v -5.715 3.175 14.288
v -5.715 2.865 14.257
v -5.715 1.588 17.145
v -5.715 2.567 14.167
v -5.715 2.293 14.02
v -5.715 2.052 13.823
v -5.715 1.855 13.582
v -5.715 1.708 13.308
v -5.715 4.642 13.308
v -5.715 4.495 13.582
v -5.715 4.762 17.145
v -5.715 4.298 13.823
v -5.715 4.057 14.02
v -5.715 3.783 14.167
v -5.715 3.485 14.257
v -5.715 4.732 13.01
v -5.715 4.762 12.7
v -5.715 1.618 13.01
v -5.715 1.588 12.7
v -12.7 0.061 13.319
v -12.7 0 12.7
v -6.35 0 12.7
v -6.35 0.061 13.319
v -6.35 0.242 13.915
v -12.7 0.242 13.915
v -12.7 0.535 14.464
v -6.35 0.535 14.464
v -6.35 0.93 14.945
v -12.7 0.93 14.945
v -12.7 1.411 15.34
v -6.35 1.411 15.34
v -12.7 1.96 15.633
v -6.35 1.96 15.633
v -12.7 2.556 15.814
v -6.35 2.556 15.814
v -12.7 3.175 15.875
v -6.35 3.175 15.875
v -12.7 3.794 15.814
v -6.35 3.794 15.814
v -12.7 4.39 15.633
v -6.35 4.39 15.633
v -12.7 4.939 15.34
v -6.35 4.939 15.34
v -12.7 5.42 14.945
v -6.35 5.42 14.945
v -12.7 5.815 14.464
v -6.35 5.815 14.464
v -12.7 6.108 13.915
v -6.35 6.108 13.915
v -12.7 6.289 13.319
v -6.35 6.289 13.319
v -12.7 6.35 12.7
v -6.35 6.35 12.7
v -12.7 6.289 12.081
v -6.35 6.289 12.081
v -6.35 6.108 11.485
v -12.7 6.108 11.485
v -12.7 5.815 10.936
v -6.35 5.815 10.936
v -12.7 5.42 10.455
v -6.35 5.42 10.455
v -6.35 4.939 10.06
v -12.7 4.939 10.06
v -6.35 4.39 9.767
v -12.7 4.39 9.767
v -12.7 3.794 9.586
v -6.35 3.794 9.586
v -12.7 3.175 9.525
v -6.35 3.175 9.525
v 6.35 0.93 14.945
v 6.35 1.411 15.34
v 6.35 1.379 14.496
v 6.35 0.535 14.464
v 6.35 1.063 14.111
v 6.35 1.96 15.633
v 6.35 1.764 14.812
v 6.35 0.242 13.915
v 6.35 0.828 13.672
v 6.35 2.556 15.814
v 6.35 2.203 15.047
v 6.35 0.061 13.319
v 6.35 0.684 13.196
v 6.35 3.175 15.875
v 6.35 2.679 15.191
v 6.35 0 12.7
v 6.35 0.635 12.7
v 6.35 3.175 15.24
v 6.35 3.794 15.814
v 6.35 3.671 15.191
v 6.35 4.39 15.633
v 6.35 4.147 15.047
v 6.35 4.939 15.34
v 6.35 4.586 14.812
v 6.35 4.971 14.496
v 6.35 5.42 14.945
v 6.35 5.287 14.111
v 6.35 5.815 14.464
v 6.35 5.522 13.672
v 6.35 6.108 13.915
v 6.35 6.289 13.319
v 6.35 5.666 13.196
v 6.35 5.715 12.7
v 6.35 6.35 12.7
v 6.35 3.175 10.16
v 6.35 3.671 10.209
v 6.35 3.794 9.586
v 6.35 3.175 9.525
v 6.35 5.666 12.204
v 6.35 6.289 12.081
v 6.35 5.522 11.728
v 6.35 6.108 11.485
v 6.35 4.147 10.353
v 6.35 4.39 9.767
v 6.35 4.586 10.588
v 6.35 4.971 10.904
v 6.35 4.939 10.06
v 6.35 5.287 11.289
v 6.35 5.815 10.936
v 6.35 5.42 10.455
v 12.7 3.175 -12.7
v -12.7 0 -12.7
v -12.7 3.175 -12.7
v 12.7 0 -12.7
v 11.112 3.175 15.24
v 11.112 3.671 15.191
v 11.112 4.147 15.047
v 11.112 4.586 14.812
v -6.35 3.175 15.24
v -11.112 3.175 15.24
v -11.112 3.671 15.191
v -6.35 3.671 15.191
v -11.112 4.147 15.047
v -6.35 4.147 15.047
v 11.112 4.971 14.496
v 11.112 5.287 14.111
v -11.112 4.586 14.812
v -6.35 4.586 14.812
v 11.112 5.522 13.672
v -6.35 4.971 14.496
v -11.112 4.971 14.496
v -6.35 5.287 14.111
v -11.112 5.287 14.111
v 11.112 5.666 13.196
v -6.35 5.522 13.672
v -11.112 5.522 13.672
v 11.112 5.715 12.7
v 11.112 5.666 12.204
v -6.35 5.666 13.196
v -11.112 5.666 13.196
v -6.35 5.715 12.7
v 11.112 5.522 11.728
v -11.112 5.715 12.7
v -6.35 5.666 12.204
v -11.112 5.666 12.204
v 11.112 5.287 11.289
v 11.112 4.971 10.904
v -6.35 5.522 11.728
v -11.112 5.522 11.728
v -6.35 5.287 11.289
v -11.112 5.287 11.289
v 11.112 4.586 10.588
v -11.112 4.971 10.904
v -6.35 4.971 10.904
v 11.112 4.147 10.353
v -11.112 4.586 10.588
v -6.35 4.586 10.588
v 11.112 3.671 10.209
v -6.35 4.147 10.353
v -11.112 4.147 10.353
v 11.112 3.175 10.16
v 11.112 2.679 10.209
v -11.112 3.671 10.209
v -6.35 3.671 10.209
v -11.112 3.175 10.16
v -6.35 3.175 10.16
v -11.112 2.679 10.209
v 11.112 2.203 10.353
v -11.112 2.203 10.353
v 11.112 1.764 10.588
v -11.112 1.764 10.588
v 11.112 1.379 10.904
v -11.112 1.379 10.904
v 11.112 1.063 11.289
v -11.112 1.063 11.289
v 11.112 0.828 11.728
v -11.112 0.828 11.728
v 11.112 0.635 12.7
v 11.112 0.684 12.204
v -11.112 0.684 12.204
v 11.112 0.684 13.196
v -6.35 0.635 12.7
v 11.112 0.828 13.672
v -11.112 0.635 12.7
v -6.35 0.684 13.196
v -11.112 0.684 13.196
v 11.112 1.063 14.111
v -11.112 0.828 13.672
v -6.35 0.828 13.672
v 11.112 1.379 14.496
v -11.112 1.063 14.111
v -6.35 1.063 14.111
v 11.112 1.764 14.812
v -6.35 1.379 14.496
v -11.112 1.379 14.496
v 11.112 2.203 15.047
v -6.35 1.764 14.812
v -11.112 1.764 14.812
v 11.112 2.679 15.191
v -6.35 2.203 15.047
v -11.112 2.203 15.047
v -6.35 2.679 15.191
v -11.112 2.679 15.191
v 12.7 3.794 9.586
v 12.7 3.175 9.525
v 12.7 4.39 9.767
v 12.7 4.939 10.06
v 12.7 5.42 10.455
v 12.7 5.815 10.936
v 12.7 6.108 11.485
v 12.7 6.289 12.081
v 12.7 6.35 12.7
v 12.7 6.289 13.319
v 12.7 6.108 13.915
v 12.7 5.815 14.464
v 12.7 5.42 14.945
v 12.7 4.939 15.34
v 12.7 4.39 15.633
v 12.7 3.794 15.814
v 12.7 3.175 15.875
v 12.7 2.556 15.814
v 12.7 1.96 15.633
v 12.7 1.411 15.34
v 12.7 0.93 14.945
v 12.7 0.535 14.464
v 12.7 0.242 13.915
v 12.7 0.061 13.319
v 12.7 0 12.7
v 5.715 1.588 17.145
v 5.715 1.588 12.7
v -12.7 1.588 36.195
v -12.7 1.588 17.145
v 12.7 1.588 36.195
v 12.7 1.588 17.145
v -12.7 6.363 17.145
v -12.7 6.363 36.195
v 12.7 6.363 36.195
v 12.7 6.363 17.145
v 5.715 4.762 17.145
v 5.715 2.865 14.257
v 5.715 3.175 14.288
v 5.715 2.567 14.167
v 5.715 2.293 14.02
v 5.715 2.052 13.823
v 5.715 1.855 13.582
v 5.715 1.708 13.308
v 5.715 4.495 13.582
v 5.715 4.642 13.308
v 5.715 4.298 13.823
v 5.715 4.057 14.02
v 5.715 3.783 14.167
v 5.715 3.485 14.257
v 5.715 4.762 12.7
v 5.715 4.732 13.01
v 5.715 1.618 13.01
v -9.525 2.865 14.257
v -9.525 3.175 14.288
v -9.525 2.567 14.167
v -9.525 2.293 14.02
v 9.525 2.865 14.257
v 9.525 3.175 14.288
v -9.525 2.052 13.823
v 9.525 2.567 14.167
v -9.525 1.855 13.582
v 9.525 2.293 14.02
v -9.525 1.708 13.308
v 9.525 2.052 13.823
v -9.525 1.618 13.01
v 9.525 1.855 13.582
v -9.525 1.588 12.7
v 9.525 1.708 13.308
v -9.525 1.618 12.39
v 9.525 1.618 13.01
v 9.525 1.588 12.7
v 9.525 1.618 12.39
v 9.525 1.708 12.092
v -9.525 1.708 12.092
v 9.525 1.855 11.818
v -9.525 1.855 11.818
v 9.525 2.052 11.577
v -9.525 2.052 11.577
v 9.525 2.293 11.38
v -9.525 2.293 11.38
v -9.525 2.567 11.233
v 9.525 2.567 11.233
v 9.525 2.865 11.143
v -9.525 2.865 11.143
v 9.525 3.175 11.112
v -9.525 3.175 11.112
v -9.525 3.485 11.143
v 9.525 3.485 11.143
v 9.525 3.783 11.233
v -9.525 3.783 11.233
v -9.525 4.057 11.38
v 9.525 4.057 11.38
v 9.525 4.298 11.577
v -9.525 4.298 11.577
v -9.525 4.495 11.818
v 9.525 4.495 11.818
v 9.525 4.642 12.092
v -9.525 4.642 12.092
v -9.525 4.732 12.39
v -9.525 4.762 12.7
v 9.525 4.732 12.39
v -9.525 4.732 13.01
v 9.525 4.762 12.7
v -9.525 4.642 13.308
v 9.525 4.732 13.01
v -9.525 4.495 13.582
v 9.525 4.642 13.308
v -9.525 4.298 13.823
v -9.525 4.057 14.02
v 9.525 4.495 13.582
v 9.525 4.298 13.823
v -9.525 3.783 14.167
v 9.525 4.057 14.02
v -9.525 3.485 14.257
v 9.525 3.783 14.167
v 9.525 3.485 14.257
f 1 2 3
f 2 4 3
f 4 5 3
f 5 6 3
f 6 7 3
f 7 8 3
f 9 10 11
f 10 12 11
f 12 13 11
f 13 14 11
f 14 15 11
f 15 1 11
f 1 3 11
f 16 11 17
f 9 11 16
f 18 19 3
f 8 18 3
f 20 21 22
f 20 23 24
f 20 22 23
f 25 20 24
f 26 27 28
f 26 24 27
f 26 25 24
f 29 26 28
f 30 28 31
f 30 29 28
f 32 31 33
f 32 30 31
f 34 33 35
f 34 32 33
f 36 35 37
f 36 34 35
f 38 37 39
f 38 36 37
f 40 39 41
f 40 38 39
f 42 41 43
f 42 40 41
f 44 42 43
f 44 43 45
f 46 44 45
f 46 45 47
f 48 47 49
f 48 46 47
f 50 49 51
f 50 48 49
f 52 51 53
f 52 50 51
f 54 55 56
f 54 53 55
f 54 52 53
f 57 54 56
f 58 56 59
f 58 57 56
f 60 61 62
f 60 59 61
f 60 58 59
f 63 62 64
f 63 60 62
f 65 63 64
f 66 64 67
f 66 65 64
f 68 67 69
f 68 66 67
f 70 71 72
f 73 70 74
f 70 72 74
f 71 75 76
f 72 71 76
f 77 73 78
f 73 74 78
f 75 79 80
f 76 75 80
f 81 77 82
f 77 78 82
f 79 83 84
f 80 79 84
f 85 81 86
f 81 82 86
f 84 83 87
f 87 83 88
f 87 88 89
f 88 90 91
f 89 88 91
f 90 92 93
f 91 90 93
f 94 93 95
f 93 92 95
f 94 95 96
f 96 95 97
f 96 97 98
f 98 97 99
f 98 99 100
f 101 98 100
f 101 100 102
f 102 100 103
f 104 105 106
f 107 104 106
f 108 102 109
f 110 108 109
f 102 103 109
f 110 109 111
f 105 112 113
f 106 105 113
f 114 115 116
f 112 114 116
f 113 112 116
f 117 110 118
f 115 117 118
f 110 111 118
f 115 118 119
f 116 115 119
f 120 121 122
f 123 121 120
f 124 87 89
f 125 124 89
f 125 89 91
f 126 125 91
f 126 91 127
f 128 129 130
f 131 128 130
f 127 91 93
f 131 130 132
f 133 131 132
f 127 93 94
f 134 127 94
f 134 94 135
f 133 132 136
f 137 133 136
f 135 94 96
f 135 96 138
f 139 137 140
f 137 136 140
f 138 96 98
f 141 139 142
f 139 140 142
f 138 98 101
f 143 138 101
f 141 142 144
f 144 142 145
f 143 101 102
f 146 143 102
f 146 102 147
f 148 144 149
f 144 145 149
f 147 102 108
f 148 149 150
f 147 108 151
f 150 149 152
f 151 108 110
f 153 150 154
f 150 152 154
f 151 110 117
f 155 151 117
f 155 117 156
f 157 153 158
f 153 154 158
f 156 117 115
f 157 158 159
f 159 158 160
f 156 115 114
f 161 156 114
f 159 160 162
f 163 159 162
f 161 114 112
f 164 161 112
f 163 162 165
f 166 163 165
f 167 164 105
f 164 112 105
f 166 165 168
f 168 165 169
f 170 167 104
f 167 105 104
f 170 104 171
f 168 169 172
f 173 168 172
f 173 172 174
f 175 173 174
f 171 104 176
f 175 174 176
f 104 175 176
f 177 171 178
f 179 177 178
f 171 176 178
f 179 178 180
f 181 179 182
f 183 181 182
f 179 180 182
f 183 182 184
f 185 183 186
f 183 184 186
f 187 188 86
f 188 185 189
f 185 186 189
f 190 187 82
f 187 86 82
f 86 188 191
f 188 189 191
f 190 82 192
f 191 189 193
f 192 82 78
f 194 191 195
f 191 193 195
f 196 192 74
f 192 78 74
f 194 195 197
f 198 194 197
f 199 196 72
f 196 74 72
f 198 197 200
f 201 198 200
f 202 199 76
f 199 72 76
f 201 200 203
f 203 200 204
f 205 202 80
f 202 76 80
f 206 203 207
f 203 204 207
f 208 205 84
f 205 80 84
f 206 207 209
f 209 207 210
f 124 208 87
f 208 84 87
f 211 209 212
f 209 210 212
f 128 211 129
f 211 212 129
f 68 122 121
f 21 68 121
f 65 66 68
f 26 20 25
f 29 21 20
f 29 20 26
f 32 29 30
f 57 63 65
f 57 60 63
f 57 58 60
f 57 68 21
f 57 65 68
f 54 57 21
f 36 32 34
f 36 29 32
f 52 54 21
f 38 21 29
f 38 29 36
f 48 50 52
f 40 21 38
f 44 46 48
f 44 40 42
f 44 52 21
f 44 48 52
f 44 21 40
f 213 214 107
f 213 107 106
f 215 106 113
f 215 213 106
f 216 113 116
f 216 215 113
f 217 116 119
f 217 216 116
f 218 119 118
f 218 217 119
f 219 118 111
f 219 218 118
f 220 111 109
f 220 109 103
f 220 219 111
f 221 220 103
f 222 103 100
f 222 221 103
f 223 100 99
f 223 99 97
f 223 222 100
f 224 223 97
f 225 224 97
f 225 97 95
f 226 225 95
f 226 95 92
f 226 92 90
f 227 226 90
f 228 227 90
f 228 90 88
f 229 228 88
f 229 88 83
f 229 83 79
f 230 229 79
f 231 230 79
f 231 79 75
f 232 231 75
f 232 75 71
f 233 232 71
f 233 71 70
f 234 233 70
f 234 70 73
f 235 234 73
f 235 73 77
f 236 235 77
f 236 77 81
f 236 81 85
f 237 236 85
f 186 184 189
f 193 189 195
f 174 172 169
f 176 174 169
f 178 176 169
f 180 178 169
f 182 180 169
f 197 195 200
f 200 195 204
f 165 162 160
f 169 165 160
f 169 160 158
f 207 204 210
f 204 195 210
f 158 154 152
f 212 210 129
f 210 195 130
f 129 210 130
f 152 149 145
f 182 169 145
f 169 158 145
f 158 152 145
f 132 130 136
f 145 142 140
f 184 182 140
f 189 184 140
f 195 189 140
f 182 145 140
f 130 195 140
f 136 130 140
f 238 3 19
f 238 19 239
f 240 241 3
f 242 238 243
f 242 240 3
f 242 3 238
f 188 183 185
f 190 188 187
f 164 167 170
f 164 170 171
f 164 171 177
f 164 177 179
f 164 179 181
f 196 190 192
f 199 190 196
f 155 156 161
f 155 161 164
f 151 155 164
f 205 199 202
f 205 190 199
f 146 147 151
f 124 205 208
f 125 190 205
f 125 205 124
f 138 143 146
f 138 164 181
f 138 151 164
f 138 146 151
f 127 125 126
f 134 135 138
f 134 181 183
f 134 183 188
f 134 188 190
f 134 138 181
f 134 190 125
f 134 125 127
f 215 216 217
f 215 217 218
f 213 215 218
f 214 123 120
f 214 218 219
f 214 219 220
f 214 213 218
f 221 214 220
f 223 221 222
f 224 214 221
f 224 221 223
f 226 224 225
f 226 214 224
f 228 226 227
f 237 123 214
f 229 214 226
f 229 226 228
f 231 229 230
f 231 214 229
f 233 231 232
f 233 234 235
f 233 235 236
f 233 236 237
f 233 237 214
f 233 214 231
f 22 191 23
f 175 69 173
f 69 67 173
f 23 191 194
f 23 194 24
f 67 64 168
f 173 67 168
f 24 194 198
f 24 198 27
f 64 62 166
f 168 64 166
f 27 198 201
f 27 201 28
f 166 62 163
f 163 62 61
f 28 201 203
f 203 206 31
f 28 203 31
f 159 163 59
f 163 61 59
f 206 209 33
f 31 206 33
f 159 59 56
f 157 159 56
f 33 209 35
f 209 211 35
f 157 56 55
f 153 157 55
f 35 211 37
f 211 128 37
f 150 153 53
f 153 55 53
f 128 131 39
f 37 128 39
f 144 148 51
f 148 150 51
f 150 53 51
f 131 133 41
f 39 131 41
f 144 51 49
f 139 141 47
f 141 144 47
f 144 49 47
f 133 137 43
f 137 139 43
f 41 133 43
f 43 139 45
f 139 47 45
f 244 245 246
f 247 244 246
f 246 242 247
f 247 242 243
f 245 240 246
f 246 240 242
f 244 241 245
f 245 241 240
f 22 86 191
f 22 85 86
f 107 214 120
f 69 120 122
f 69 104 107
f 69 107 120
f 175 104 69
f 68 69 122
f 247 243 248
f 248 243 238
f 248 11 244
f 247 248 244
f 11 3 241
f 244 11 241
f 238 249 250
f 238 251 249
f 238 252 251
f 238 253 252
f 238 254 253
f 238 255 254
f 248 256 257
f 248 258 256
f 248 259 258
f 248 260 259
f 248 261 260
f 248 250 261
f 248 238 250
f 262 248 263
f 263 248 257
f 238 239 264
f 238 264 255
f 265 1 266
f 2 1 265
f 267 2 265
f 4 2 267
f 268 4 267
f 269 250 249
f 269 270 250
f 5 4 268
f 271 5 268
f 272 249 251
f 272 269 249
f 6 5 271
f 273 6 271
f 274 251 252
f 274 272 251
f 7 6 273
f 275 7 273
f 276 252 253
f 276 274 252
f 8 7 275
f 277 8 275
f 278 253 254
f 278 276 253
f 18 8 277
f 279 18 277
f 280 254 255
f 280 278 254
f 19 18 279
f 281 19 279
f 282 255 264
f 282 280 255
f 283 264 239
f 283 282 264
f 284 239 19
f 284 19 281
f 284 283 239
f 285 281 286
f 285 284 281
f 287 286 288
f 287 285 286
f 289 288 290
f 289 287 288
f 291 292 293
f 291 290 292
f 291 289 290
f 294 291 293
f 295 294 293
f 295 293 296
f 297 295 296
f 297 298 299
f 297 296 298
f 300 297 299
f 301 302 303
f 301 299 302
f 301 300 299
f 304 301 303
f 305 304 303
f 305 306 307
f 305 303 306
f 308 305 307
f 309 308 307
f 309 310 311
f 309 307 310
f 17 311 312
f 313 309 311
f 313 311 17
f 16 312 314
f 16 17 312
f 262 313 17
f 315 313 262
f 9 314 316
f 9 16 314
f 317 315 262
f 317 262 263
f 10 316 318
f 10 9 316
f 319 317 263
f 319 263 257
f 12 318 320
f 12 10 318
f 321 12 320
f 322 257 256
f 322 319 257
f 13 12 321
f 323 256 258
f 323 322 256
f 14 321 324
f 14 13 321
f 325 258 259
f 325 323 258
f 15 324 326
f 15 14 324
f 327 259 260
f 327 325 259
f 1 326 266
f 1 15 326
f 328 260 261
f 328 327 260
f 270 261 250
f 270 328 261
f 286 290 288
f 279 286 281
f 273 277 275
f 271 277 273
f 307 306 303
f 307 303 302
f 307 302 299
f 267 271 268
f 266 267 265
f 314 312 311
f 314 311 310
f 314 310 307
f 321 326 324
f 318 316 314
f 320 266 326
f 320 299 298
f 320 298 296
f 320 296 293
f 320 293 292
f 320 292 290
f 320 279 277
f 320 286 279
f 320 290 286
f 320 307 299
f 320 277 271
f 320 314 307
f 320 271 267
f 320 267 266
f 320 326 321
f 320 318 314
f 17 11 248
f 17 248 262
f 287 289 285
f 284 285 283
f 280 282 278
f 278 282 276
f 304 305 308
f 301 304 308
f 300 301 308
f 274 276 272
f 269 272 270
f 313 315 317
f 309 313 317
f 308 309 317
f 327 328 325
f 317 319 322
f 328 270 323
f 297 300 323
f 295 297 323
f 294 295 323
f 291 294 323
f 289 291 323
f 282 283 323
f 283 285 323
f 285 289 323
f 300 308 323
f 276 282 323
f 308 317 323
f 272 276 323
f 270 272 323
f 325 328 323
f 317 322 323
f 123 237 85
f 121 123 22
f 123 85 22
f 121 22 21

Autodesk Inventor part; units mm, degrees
ref_plane "YZ Plane" through (0, 0, 0) normal (1, 0, 0) x (0, 1, 0)
ref_plane "XZ Plane" through (0, 0, 0) normal (0, 1, 0) x (-1, 0, 0)
ref_plane "XY Plane" through (0, 0, 0) normal (0, 0, 1) x (1, 0, 0)
sketch "Sketch1" plane through (0, 0, 0) normal (0, 1, 0) x (-1, 0, 0)
  line L0 (-12.7, 12.7) -> (12.7, 12.7)
  line L1 (12.7, 12.7) -> (12.7, -12.7)
  line L2 (12.7, -12.7) -> (-12.7, -12.7)
  line L3 (-12.7, -12.7) -> (-12.7, 12.7)
  line L4 (-12.7, 12.7) -> (12.7, -12.7) construction
  line L5 (12.7, 12.7) -> (-12.7, -12.7) construction
  point P0 (0, 0)
  dimension "d0" = 25.4
  dimension "d1" = 25.4
extrude "Extrusion1" add sketch "Sketch1" along normal blind 3.175
sketch "Sketch2" plane through (12.7, 0, 12.7) normal (1, 0, 0) x (0, 0, -1)
  circle A0 centre (0, 3.175) radius 3.175
  point P0 (12.7, 0)
extrude "Extrusion2" add sketch "Sketch2" against normal blind 6.35
mirror "Mirror1" about plane through (0, 0, 0) normal (1, 0, 0) of "Extrusion2"
sketch "Sketch3" plane through (6.35, 0, 12.7) normal (-1, 0, 0) x (0, 0, 1)
  arc A0 (0, 0) -> (-3.175, 3.175) centre (0, 3.175) ccw projected
  circle A1 centre (0, 3.175) radius 2.54
  point P0 (-12.7, 0)
  dimension "d6" = 0.635
extrude "Extrusion3" cut sketch "Sketch3" against normal blind 4.7625 and the other way blind 17.4625
ref_plane "Work Plane1" through (-9.525, 3.175, 12.7) normal (1, 0, 0) x (0, 0, -1)
ref_plane "Work Plane2" through (9.525, 3.175, 12.7) normal (-1, 0, 0) x (0, 0, 1)
sketch "Sketch5" plane through (9.525, 3.175, 12.7) normal (-1, 0, 0) x (0, 0, 1)
  arc A0 (0, -2.54) -> (-2.54, 0) centre (0, 0) ccw projected
  circle A1 centre (0, 0) radius 1.5875
  point P0 (-12.7, -3.175)
  dimension "d13" = 3.175
extrude "Extrusion4" add sketch "Sketch5" along normal up to surface (19.05 mm away)
sketch "Sketch6" plane through (0, 0, 0) normal (1, 0, 0) x (0, 1, 0)
  circle A0 centre (3.175, 12.7) radius 1.5875 projected
  circle A1 centre (3.175, 12.7) radius 1.5875 projected
  arc A2 (1.5875, 12.7) -> (4.7625, 12.7) centre (3.175, 12.7) ccw
  line L0 (1.5875, 12.7) -> (1.5875, 17.145)
  circle A3 centre (3.175, 12.7) radius 1.5875 projected
  line L1 (4.7625, 17.145) -> (4.7625, 12.7)
  arc A4 (3.175, 9.525) -> (0, 12.7) centre (3.175, 12.7) ccw projected
  line L2 (1.5875, 17.145) -> (4.7625, 17.145)
  line L3 (1.5875, 15.875) -> (4.7625, 15.875) construction
  point P0 (0, 0)
  dimension "d18" = 1.27
extrude "Extrusion5" add sketch "Sketch6" along normal mid plane 11.43 contours A0 L0 A4 L1 | A4 L0 L2 L1
sketch "Sketch9" plane through (-5.715, 1.5875, 12.7) normal (0, -1, 0) x (1, 0, 0)
  line L0 (-6.985, 23.495) -> (18.415, 23.495)
  line L1 (18.415, 23.495) -> (18.415, 4.445)
  line L2 (18.415, 4.445) -> (-6.985, 4.445)
  line L3 (-6.985, 4.445) -> (-6.985, 23.495)
  line L4 (0, 4.445) -> (11.43, 4.445) projected
  line L5 (18.415, -25.4) -> (18.415, 0) projected
  point P0 (5.715, -12.7)
  dimension "d25" = 25.4
  dimension "d26" = 19.05
extrude "Extrusion8" add sketch "Sketch9" against normal blind 4.7752
properties part number "hinge"
